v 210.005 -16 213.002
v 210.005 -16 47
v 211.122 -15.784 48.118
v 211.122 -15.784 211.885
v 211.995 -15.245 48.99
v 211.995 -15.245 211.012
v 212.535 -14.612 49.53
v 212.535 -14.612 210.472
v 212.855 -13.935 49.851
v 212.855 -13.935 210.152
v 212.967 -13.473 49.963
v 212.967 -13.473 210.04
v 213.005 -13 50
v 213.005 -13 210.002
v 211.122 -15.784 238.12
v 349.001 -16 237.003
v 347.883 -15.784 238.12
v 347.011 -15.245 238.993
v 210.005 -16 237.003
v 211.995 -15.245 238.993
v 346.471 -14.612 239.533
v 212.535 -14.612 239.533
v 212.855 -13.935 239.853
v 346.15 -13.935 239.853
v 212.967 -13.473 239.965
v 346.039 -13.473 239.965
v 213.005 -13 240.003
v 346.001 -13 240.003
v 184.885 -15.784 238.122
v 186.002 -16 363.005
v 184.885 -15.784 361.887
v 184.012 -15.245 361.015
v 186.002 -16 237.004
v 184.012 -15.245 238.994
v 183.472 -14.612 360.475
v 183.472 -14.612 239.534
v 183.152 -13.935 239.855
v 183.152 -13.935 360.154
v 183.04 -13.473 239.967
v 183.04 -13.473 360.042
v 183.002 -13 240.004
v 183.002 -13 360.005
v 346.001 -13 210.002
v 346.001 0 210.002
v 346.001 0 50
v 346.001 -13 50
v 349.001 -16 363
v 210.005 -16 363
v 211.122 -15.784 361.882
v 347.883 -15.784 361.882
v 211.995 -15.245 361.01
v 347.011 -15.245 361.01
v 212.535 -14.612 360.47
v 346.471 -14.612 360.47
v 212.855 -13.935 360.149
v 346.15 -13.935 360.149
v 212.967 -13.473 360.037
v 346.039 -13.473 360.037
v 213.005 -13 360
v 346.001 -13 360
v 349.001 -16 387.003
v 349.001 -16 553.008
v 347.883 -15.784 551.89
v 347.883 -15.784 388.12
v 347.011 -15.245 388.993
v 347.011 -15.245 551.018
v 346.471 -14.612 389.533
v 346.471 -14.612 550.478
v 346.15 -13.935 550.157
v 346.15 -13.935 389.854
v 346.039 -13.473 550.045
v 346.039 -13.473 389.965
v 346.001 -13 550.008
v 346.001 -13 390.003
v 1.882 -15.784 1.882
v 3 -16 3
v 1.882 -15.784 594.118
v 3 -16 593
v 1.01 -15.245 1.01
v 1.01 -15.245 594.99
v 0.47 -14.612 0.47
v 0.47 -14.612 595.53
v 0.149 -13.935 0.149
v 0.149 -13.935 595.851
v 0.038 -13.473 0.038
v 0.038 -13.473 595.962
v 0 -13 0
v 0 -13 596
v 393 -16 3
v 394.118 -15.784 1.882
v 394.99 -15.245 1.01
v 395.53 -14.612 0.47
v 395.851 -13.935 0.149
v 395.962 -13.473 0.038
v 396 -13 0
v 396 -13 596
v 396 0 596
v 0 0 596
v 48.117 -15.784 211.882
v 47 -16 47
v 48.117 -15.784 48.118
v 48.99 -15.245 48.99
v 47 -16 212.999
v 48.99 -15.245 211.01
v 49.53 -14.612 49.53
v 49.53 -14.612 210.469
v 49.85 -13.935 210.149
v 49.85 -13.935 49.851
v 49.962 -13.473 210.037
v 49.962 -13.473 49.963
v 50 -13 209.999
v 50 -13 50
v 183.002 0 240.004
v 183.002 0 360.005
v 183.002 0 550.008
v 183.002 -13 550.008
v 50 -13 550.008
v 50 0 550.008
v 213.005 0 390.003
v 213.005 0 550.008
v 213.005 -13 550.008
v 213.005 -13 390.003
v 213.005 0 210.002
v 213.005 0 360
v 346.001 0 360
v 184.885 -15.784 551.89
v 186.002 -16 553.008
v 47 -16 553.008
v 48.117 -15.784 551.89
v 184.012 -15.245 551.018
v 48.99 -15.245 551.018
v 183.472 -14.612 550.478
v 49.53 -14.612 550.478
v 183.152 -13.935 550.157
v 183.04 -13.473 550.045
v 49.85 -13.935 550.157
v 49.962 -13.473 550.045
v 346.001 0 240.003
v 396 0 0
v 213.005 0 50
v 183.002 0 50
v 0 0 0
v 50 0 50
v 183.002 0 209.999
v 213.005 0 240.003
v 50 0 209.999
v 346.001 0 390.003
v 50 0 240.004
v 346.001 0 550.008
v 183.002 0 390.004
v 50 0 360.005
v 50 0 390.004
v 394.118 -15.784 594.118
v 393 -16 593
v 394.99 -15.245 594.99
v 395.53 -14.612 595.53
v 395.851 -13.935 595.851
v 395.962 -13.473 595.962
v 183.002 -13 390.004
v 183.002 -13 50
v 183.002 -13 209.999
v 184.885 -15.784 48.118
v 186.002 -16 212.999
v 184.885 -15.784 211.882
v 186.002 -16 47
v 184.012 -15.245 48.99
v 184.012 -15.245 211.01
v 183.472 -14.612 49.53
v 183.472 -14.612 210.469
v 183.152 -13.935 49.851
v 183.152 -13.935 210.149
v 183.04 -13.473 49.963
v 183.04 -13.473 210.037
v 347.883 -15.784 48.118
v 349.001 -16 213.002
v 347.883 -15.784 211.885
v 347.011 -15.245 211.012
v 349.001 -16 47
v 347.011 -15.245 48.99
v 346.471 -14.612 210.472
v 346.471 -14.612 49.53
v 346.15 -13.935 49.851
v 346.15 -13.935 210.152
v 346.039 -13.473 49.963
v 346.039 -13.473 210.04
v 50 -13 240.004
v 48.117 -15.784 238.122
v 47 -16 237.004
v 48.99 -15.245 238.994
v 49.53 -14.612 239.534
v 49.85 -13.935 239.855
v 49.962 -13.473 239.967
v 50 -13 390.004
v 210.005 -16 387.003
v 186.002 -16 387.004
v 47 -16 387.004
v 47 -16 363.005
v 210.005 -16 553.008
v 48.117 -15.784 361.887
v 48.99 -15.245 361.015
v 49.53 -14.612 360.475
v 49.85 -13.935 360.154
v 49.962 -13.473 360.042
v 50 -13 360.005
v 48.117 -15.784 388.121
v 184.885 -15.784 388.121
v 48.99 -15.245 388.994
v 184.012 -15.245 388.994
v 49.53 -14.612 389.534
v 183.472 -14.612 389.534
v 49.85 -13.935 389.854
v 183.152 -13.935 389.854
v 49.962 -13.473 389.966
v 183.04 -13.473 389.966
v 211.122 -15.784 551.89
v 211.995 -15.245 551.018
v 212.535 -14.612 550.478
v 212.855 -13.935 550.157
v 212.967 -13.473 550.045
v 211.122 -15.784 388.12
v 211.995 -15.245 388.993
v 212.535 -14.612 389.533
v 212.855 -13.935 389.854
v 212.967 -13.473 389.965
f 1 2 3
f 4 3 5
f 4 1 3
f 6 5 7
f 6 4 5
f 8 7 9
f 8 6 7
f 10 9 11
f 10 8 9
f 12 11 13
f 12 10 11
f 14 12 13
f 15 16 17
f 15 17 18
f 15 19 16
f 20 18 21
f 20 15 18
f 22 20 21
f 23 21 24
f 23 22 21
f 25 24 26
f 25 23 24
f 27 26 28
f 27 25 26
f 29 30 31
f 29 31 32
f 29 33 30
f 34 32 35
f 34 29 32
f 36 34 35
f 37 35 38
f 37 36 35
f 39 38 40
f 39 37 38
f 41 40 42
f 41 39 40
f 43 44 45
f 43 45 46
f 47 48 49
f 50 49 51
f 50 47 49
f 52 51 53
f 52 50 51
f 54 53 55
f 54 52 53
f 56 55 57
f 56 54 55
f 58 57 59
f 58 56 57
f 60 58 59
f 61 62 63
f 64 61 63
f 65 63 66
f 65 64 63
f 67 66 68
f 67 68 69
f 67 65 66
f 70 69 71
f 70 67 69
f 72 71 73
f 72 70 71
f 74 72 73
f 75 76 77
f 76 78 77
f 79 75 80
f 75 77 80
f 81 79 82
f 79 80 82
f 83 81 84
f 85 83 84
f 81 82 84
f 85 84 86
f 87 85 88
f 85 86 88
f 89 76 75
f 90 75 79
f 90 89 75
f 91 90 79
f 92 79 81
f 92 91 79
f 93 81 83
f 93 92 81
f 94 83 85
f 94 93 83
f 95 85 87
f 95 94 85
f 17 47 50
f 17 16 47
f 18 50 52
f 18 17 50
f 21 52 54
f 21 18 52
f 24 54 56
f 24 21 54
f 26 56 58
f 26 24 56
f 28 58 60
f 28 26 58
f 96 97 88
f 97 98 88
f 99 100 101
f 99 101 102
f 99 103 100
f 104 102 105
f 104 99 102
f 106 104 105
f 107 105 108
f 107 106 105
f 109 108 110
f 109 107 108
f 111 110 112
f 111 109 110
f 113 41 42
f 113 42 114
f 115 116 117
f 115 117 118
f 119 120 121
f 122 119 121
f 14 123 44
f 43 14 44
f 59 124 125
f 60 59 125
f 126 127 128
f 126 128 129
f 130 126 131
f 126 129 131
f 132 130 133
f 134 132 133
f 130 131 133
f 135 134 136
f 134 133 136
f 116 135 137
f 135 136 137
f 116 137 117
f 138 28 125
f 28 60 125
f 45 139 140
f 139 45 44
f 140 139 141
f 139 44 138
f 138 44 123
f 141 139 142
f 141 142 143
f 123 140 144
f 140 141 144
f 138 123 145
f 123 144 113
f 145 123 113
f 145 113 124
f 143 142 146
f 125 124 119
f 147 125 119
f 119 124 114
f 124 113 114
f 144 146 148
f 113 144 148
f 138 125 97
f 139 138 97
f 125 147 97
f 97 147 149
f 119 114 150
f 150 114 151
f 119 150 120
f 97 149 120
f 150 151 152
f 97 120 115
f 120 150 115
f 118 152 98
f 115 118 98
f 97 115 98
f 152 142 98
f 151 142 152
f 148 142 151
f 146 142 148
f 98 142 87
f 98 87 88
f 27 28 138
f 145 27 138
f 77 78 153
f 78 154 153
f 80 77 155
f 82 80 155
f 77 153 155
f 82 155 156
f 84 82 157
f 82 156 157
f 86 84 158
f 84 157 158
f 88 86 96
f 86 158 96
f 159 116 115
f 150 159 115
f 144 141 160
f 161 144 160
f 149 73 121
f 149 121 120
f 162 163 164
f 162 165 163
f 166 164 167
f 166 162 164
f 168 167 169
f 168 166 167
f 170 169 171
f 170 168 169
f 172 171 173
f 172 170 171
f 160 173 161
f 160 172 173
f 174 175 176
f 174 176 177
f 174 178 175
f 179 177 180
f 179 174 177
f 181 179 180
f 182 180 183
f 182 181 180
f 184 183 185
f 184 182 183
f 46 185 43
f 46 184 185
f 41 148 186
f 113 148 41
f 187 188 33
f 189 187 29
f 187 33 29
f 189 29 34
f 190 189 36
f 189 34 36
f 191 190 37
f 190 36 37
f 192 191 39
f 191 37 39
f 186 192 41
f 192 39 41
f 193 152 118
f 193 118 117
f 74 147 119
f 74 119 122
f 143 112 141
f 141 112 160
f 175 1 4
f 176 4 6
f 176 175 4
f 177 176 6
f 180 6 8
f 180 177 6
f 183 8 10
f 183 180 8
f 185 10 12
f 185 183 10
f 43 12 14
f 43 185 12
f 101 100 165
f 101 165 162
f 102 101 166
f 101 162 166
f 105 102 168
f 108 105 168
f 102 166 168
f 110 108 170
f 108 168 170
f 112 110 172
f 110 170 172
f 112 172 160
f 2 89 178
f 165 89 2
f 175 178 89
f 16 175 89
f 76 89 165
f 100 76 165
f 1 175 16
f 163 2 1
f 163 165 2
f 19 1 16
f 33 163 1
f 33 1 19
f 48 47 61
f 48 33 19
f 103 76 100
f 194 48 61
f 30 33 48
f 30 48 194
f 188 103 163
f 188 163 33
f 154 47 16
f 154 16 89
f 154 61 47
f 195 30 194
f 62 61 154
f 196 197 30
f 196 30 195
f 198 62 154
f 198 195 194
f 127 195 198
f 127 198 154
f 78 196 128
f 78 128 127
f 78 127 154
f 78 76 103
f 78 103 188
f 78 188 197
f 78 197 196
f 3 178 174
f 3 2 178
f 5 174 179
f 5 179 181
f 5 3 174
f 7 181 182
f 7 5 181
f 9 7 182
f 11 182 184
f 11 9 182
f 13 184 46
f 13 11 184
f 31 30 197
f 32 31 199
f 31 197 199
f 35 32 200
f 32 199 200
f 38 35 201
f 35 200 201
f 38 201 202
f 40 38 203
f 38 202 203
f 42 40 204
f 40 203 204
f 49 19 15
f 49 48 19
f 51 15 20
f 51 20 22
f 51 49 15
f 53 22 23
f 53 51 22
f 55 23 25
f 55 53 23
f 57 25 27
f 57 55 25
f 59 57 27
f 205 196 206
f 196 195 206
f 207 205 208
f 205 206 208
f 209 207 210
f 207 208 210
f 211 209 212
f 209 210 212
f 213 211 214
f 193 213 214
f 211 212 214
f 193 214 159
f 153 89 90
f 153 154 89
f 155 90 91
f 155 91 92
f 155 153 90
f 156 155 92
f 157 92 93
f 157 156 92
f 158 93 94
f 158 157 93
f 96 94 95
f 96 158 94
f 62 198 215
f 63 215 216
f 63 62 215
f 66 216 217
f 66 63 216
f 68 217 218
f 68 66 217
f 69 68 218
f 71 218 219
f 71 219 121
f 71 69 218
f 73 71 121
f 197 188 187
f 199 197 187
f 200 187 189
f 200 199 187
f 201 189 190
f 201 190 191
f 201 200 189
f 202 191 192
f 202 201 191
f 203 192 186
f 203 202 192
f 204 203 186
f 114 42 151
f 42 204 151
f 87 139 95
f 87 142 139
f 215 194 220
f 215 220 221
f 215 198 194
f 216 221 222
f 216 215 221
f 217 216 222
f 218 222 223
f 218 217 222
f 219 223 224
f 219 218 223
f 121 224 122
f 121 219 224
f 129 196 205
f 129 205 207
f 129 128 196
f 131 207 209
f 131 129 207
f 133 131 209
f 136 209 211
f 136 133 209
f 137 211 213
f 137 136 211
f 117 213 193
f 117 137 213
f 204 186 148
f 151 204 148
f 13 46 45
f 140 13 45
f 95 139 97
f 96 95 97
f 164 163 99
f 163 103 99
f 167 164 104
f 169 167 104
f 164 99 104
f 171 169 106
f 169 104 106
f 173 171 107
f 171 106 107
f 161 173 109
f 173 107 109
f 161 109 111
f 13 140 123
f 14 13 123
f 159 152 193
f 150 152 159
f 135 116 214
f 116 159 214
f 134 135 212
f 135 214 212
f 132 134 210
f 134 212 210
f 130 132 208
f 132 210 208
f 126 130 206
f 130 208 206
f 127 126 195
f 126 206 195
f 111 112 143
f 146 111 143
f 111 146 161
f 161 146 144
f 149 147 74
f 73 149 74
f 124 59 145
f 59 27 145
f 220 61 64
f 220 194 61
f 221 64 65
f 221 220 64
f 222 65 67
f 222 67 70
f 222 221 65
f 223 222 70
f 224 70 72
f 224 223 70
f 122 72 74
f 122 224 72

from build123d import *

# Parameters (mm, degrees)
F0_W      = 28.8499742746
F0_H      = 37.8827601671
F1_DEPTH  = 16
F2_DEPTH  = 296
F3_DEPTH  = 996
F4_W      = 199.8313069344
F4_H      = 801.1276721954
F5_DEPTH  = 5
F6_DEPTH  = 39.21
F7_DEPTH  = 2.24
F8_DEPTH  = 55.66
F9_DEPTH  = 1.59
F10_W     = 54.77245152
F10_H     = 895.9976721954
F11_DEPTH = 5
F12_DEPTH = 5.86
F13_DEPTH = 18.91
F14_W     = 83.0026693535
F14_H     = 34.9487662315
F14_H_2   = 55.274695158
F15_W     = 82.9961860609
F15_H     = 44.8832511902
F15_H_2   = 52.5203943253
F16_DEPTH = 5
F17_DEPTH = 300
F18_DEPTH = 300
F19_DEPTH = 324.79
F20_DEPTH = 324.79
F21_DEPTH = 250
F22_DEPTH = 250
F23_DEPTH = 100
F24_DEPTH = 100
F25_DEPTH = 50
F26_DEPTH = 50
F27_DEPTH = 134.02
F28_DEPTH = 100
F29_DEPTH = 100
F30_DEPTH = 100
F31_DEPTH = 50
F32_DEPTH = 54.95
F33_DEPTH = 50
F34_DEPTH = 109.29
F35_DEPTH = 14.88
F36_DEPTH = 230.15
F37_DEPTH = 230.15
F38_DEPTH = 22.52
F39_DEPTH = 77.2
F40_DEPTH = 77.2
F41_DEPTH = 11
F42_DEPTH = 100
F43_DEPTH = 100
F44_DEPTH = 195.99
F45_DEPTH = 195.99
F46_DEPTH = 295.99
F47_DEPTH = 295.99
F48_DEPTH = 100
F49_DEPTH = 104.01
F50_DEPTH = 20
F51_DEPTH = 20
F52_DEPTH = 20
F53_DEPTH = 80
F54_DEPTH = 80
F55_DEPTH = 20
F56_DEPTH = 20
F57_DEPTH = 20
F58_DEPTH = 20
F59_DEPTH = 100
F60_DEPTH = 100
F61_DEPTH = 50
F62_DEPTH = 50
F63_R     = 3


with BuildPart() as f1:
    # F0 (on Front) → F1 (new body)
    with BuildSketch(Plane.XZ):
        with Locations((14.4249871373, 18.9413800836)):
            Rectangle(F0_W, F0_H)
    extrude(amount=F1_DEPTH)

    # F2 (add): a face of the model
    f2_faces = [f1.faces().sort_by_distance(p)[0] for p in [
        (0, -8, 18.9413800836),
    ]]
    extrude(f2_faces, amount=-F2_DEPTH)

    # F3 (add): a face of the model
    f3_faces = [f1.faces().sort_by_distance(p)[0] for p in [
        (148, -8, 0),
    ]]
    extrude(f3_faces, amount=-F3_DEPTH)

    # F4 (on face) → F5 (cut)
    with BuildSketch(Plane.XZ.offset(16)):
        with Locations((148.3252942562, 506.2239170074)):
            Rectangle(F4_W, F4_H)
    extrude(amount=-F5_DEPTH, mode=Mode.SUBTRACT)

    # F6 (cut): a face of the model
    f6_faces = [f1.faces().sort_by_distance(p)[0] for p in [
        (148.3252942562, -13.5, 906.7877531052),
    ]]
    extrude(f6_faces, amount=-F6_DEPTH, mode=Mode.SUBTRACT)

    # F7 (add): a face of the model
    f7_faces = [f1.faces().sort_by_distance(p)[0] for p in [
        (248.2409477234, -13.5, 525.8289170074),
    ]]
    extrude(f7_faces, amount=F7_DEPTH)

    # F8 (cut): a face of the model
    f8_faces = [f1.faces().sort_by_distance(p)[0] for p in [
        (147.2052942562, -13.5, 105.6600809097),
    ]]
    extrude(f8_faces, amount=-F8_DEPTH, mode=Mode.SUBTRACT)

    # F9 (add): a face of the model
    f9_faces = [f1.faces().sort_by_distance(p)[0] for p in [
        (48.409640789, -13.5, 497.9989170074),
    ]]
    extrude(f9_faces, amount=F9_DEPTH)

    # F10 (on face) → F11 (join)
    with BuildSketch(Plane.XZ.offset(11)):
        with Locations((154.5285359025, 497.9989170074)):
            Rectangle(F10_W, F10_H)
    extrude(amount=F11_DEPTH)

    # F12 (cut): a face of the model
    f12_faces = [f1.faces().sort_by_distance(p)[0] for p in [
        (127.1423101425, -13.5, 497.9989170074),
    ]]
    extrude(f12_faces, amount=-F12_DEPTH, mode=Mode.SUBTRACT)

    # F13 (cut): a face of the model
    f13_faces = [f1.faces().sort_by_distance(p)[0] for p in [
        (181.9147616625, -13.5, 497.9989170074),
    ]]
    extrude(f13_faces, amount=-F13_DEPTH, mode=Mode.SUBTRACT)

    # F14 (on face) + F15 (on face) → F16 (join)
    with BuildSketch(Plane.XZ.offset(11)):
        with Locations((91.5009754658, 853.3093035221)):
            Rectangle(F14_W, F14_H)
        with Locations((91.5009754658, 511.6568356752)):
            Rectangle(F14_W, F14_H_2)
    with BuildSketch(Plane.XZ.offset(11)):
        with Locations((204.5028546929, 853.7013530731)):
            Rectangle(F15_W, F15_H)
        with Locations((204.5028546929, 576.5425562859)):
            Rectangle(F15_W, F15_H_2)
    extrude(amount=F16_DEPTH)

    # F17 (add): faces of the model
    f17_faces = [f1.faces().sort_by_distance(p)[0] for p in [
        (204.5028546929, -13.5, 550.2823591232),
        (91.5009754658, -13.5, 484.0194880962),
    ]]
    extrude(f17_faces, amount=F17_DEPTH)

    # F18 (cut): faces of the model
    f18_faces = [f1.faces().sort_by_distance(p)[0] for p in [
        (91.5009754658, -13.5, 539.2941832542),
        (204.5028546929, -13.5, 602.8027534485),
    ]]
    extrude(f18_faces, amount=-F18_DEPTH, mode=Mode.SUBTRACT)

    # F19 (add): a face of the model
    f19_faces = [f1.faces().sort_by_distance(p)[0] for p in [
        (91.5009754658, -13.5, 835.8349204063),
    ]]
    extrude(f19_faces, amount=F19_DEPTH)

    # F20 (cut): a face of the model
    f20_faces = [f1.faces().sort_by_distance(p)[0] for p in [
        (91.5009754658, -13.5, 870.7836866379),
    ]]
    extrude(f20_faces, amount=-F20_DEPTH, mode=Mode.SUBTRACT)

    # F21 (add): a face of the model
    f21_faces = [f1.faces().sort_by_distance(p)[0] for p in [
        (91.5009754658, -13.5, 239.2941832542),
    ]]
    extrude(f21_faces, amount=F21_DEPTH)

    # F22 (cut): a face of the model
    f22_faces = [f1.faces().sort_by_distance(p)[0] for p in [
        (91.5009754658, -13.5, 184.0194880962),
    ]]
    extrude(f22_faces, amount=-F22_DEPTH, mode=Mode.SUBTRACT)

    # F23 (add): a face of the model
    f23_faces = [f1.faces().sort_by_distance(p)[0] for p in [
        (91.5009754658, -13.5, 545.9936866379),
    ]]
    extrude(f23_faces, amount=F23_DEPTH)

    # F24 (cut): a face of the model
    f24_faces = [f1.faces().sort_by_distance(p)[0] for p in [
        (91.5009754658, -13.5, 511.0449204063),
    ]]
    extrude(f24_faces, amount=-F24_DEPTH, mode=Mode.SUBTRACT)

    # F25 (add): a face of the model
    f25_faces = [f1.faces().sort_by_distance(p)[0] for p in [
        (91.5009754658, -13.5, 645.9936866379),
    ]]
    extrude(f25_faces, amount=F25_DEPTH)

    # F26 (cut): a face of the model
    f26_faces = [f1.faces().sort_by_distance(p)[0] for p in [
        (91.5009754658, -13.5, 611.0449204063),
    ]]
    extrude(f26_faces, amount=-F26_DEPTH, mode=Mode.SUBTRACT)

    # F27 (add): a face of the model
    f27_faces = [f1.faces().sort_by_distance(p)[0] for p in [
        (91.5009754658, -13.5, 434.0194880962),
    ]]
    extrude(f27_faces, amount=F27_DEPTH)

    # F28 (cut): a face of the model
    f28_faces = [f1.faces().sort_by_distance(p)[0] for p in [
        (91.5009754658, -13.5, 299.9994880962),
    ]]
    extrude(f28_faces, amount=-F28_DEPTH, mode=Mode.SUBTRACT)

    # F29 (add): a face of the model
    f29_faces = [f1.faces().sort_by_distance(p)[0] for p in [
        (91.5009754658, -13.5, 661.0449204063),
    ]]
    extrude(f29_faces, amount=F29_DEPTH)

    # F30 (cut): a face of the model
    f30_faces = [f1.faces().sort_by_distance(p)[0] for p in [
        (91.5009754658, -13.5, 695.9936866379),
    ]]
    extrude(f30_faces, amount=-F30_DEPTH, mode=Mode.SUBTRACT)

    # F31 (add): a face of the model
    f31_faces = [f1.faces().sort_by_distance(p)[0] for p in [
        (91.5009754658, -13.5, 595.9936866379),
    ]]
    extrude(f31_faces, amount=F31_DEPTH)

    # F32 (cut): a face of the model
    f32_faces = [f1.faces().sort_by_distance(p)[0] for p in [
        (91.5009754658, -13.5, 561.0449204063),
    ]]
    extrude(f32_faces, amount=-F32_DEPTH, mode=Mode.SUBTRACT)

    # F33 (add): a face of the model
    f33_faces = [f1.faces().sort_by_distance(p)[0] for p in [
        (91.5009754658, -13.5, 399.9994880962),
    ]]
    extrude(f33_faces, amount=F33_DEPTH)

    # F34 (cut): a face of the model
    f34_faces = [f1.faces().sort_by_distance(p)[0] for p in [
        (91.5009754658, -13.5, 489.2941832542),
    ]]
    extrude(f34_faces, amount=-F34_DEPTH, mode=Mode.SUBTRACT)

    # F35 (cut): a face of the model
    f35_faces = [f1.faces().sort_by_distance(p)[0] for p in [
        (204.5028546929, -13.5, 831.259727478),
    ]]
    extrude(f35_faces, amount=-F35_DEPTH, mode=Mode.SUBTRACT)

    # F36 (add): a face of the model
    f36_faces = [f1.faces().sort_by_distance(p)[0] for p in [
        (204.5028546929, -13.5, 846.139727478),
    ]]
    extrude(f36_faces, amount=F36_DEPTH)

    # F37 (cut): a face of the model
    f37_faces = [f1.faces().sort_by_distance(p)[0] for p in [
        (204.5028546929, -13.5, 876.1429786682),
    ]]
    extrude(f37_faces, amount=-F37_DEPTH, mode=Mode.SUBTRACT)

    # F38 (cut): a face of the model
    f38_faces = [f1.faces().sort_by_distance(p)[0] for p in [
        (204.5028546929, -13.5, 250.2823591232),
    ]]
    extrude(f38_faces, amount=-F38_DEPTH, mode=Mode.SUBTRACT)

    # F39 (add): a face of the model
    f39_faces = [f1.faces().sort_by_distance(p)[0] for p in [
        (204.5028546929, -13.5, 302.8027534485),
    ]]
    extrude(f39_faces, amount=F39_DEPTH)

    # F40 (cut): a face of the model
    f40_faces = [f1.faces().sort_by_distance(p)[0] for p in [
        (204.5028546929, -13.5, 272.8023591232),
    ]]
    extrude(f40_faces, amount=-F40_DEPTH, mode=Mode.SUBTRACT)

    # F41 (cut): faces of the model
    f41_faces = [f1.faces().sort_by_distance(p)[0] for p in [
        (91.5009754658, -11, 795.9957198715),
        (204.5028546929, -11, 795.9953658867),
        (204.5028546929, -11, 497.9962404633),
        (91.5009754658, -11, 497.9995518303),
        (91.5009754658, -11, 199.999784503),
        (204.5028546929, -11, 200.0012200165),
    ]]
    extrude(f41_faces, amount=-F41_DEPTH, mode=Mode.SUBTRACT)

    # F42 (add): faces of the model
    f42_faces = [f1.faces().sort_by_distance(p)[0] for p in [
        (91.5009754658, -8, 349.9994880962),
        (204.5028546929, -8, 350.0023591232),
    ]]
    extrude(f42_faces, amount=F42_DEPTH)

    # F43 (cut): faces of the model
    f43_faces = [f1.faces().sort_by_distance(p)[0] for p in [
        (91.5009754658, -8, 380.0041832542),
        (204.5028546929, -8, 380.0027534485),
    ]]
    extrude(f43_faces, amount=-F43_DEPTH, mode=Mode.SUBTRACT)

    # F44 (add): faces of the model
    f44_faces = [f1.faces().sort_by_distance(p)[0] for p in [
        (91.5009754658, -8, 615.9949204063),
        (204.5028546929, -8, 615.989727478),
    ]]
    extrude(f44_faces, amount=F44_DEPTH)

    # F45 (cut): faces of the model
    f45_faces = [f1.faces().sort_by_distance(p)[0] for p in [
        (91.5009754658, -8, 645.9936866379),
        (204.5028546929, -8, 645.9929786682),
    ]]
    extrude(f45_faces, amount=-F45_DEPTH, mode=Mode.SUBTRACT)

    # F46 (add): faces of the model
    f46_faces = [f1.faces().sort_by_distance(p)[0] for p in [
        (91.5009754658, -8, 945.9977531052),
        (204.5028546929, -8, 945.9977531052),
    ]]
    extrude(f46_faces, amount=F46_DEPTH)

    # F47 (cut): a face of the model
    f47_faces = [f1.faces().sort_by_distance(p)[0] for p in [
        (148, -8, 996),
    ]]
    extrude(f47_faces, amount=-F47_DEPTH, mode=Mode.SUBTRACT)

    # F48 (add): faces of the model
    f48_faces = [f1.faces().sort_by_distance(p)[0] for p in [
        (204.5028546929, -8, 650.0077531052),
        (91.5009754658, -8, 650.0077531052),
    ]]
    extrude(f48_faces, amount=F48_DEPTH)

    # F49 (cut): a face of the model
    f49_faces = [f1.faces().sort_by_distance(p)[0] for p in [
        (148, -8, 700.01),
    ]]
    extrude(f49_faces, amount=-F49_DEPTH, mode=Mode.SUBTRACT)

    # F50 (add): a face of the model
    f50_faces = [f1.faces().sort_by_distance(p)[0] for p in [
        (91.5009754658, -8, 249.9994880962),
    ]]
    extrude(f50_faces, amount=F50_DEPTH)

    # F51 (add): a face of the model
    f51_faces = [f1.faces().sort_by_distance(p)[0] for p in [
        (204.5028546929, -8, 250.0023591232),
    ]]
    extrude(f51_faces, amount=F51_DEPTH)

    # F52 (cut): faces of the model
    f52_faces = [f1.faces().sort_by_distance(p)[0] for p in [
        (91.5009754658, -8, 280.0041832542),
        (204.5028546929, -8, 280.0027534485),
    ]]
    extrude(f52_faces, amount=-F52_DEPTH, mode=Mode.SUBTRACT)

    # F53 (add): faces of the model
    f53_faces = [f1.faces().sort_by_distance(p)[0] for p in [
        (204.5028546929, -8, 419.999727478),
        (91.5009754658, -8, 420.0049204063),
    ]]
    extrude(f53_faces, amount=F53_DEPTH)

    # F54 (cut): faces of the model
    f54_faces = [f1.faces().sort_by_distance(p)[0] for p in [
        (91.5009754658, -8, 450.0036866379),
        (204.5028546929, -8, 450.0029786682),
    ]]
    extrude(f54_faces, amount=-F54_DEPTH, mode=Mode.SUBTRACT)

    # F55 (add): faces of the model
    f55_faces = [f1.faces().sort_by_distance(p)[0] for p in [
        (204.5028546929, -8, 370.0029786682),
        (91.5009754658, -8, 370.0036866379),
    ]]
    extrude(f55_faces, amount=F55_DEPTH)

    # F56 (cut): faces of the model
    f56_faces = [f1.faces().sort_by_distance(p)[0] for p in [
        (91.5009754658, -8, 340.0049204063),
        (204.5028546929, -8, 339.999727478),
    ]]
    extrude(f56_faces, amount=-F56_DEPTH, mode=Mode.SUBTRACT)

    # F57 (add): faces of the model
    f57_faces = [f1.faces().sort_by_distance(p)[0] for p in [
        (204.5028546929, -8, 230.0023591232),
        (91.5009754658, -8, 229.9994880962),
    ]]
    extrude(f57_faces, amount=F57_DEPTH)

    # F58 (cut): faces of the model
    f58_faces = [f1.faces().sort_by_distance(p)[0] for p in [
        (204.5028546929, -8, 260.0027534485),
        (91.5009754658, -8, 260.0041832542),
    ]]
    extrude(f58_faces, amount=-F58_DEPTH, mode=Mode.SUBTRACT)

    # F59 (add): a face of the model
    f59_faces = [f1.faces().sort_by_distance(p)[0] for p in [
        (296, -8, 298),
    ]]
    extrude(f59_faces, amount=F59_DEPTH)

    # F60 (cut): faces of the model
    f60_faces = [f1.faces().sort_by_distance(p)[0] for p in [
        (246.0009477234, -8, 470.0053658867),
        (246.0009477234, -8, 300.0012404633),
        (246.0009477234, -8, 130.0012200165),
    ]]
    extrude(f60_faces, amount=-F60_DEPTH, mode=Mode.SUBTRACT)

    # F61 (add): faces of the model
    f61_faces = [f1.faces().sort_by_distance(p)[0] for p in [
        (163.0047616625, -8, 470.0053658867),
        (163.0047616625, -8, 300.0012404633),
        (163.0047616625, -8, 130.0012200165),
    ]]
    extrude(f61_faces, amount=F61_DEPTH)

    # F62 (cut): faces of the model
    f62_faces = [f1.faces().sort_by_distance(p)[0] for p in [
        (133.0023101425, -8, 470.0057198715),
        (133.0023101425, -8, 300.0045518303),
        (133.0023101425, -8, 129.999784503),
    ]]
    extrude(f62_faces, amount=-F62_DEPTH, mode=Mode.SUBTRACT)

    # F63
    f63_edges = [f1.edges().sort_by_distance(p)[0] for p in [
        (0, -16, 298),
        (198, -16, 0),
        (396, -16, 298),
        (198, -16, 596),
        (116.500975, -16, 209.999488),
        (183.00231, -16, 129.999785),
        (116.500975, -16, 50.000081),
        (49.999641, -16, 129.999785),
        (279.502855, -16, 210.002359),
        (346.000948, -16, 130.00122),
        (279.502855, -16, 50.000081),
        (213.004762, -16, 130.00122),
        (279.502855, -16, 359.999727),
        (346.000948, -16, 300.00124),
        (279.502855, -16, 240.002753),
        (213.004762, -16, 300.00124),
        (116.500975, -16, 360.00492),
        (183.00231, -16, 300.004552),
        (116.500975, -16, 240.004183),
        (49.999641, -16, 300.004552),
        (116.500975, -16, 390.003687),
        (49.999641, -16, 470.00572),
        (116.500975, -16, 550.007753),
        (183.00231, -16, 470.00572),
        (279.502855, -16, 390.002979),
        (213.004762, -16, 470.005366),
        (279.502855, -16, 550.007753),
        (346.000948, -16, 470.005366),
    ]]
    fillet(f63_edges, radius=F63_R)


solid = f1.part
